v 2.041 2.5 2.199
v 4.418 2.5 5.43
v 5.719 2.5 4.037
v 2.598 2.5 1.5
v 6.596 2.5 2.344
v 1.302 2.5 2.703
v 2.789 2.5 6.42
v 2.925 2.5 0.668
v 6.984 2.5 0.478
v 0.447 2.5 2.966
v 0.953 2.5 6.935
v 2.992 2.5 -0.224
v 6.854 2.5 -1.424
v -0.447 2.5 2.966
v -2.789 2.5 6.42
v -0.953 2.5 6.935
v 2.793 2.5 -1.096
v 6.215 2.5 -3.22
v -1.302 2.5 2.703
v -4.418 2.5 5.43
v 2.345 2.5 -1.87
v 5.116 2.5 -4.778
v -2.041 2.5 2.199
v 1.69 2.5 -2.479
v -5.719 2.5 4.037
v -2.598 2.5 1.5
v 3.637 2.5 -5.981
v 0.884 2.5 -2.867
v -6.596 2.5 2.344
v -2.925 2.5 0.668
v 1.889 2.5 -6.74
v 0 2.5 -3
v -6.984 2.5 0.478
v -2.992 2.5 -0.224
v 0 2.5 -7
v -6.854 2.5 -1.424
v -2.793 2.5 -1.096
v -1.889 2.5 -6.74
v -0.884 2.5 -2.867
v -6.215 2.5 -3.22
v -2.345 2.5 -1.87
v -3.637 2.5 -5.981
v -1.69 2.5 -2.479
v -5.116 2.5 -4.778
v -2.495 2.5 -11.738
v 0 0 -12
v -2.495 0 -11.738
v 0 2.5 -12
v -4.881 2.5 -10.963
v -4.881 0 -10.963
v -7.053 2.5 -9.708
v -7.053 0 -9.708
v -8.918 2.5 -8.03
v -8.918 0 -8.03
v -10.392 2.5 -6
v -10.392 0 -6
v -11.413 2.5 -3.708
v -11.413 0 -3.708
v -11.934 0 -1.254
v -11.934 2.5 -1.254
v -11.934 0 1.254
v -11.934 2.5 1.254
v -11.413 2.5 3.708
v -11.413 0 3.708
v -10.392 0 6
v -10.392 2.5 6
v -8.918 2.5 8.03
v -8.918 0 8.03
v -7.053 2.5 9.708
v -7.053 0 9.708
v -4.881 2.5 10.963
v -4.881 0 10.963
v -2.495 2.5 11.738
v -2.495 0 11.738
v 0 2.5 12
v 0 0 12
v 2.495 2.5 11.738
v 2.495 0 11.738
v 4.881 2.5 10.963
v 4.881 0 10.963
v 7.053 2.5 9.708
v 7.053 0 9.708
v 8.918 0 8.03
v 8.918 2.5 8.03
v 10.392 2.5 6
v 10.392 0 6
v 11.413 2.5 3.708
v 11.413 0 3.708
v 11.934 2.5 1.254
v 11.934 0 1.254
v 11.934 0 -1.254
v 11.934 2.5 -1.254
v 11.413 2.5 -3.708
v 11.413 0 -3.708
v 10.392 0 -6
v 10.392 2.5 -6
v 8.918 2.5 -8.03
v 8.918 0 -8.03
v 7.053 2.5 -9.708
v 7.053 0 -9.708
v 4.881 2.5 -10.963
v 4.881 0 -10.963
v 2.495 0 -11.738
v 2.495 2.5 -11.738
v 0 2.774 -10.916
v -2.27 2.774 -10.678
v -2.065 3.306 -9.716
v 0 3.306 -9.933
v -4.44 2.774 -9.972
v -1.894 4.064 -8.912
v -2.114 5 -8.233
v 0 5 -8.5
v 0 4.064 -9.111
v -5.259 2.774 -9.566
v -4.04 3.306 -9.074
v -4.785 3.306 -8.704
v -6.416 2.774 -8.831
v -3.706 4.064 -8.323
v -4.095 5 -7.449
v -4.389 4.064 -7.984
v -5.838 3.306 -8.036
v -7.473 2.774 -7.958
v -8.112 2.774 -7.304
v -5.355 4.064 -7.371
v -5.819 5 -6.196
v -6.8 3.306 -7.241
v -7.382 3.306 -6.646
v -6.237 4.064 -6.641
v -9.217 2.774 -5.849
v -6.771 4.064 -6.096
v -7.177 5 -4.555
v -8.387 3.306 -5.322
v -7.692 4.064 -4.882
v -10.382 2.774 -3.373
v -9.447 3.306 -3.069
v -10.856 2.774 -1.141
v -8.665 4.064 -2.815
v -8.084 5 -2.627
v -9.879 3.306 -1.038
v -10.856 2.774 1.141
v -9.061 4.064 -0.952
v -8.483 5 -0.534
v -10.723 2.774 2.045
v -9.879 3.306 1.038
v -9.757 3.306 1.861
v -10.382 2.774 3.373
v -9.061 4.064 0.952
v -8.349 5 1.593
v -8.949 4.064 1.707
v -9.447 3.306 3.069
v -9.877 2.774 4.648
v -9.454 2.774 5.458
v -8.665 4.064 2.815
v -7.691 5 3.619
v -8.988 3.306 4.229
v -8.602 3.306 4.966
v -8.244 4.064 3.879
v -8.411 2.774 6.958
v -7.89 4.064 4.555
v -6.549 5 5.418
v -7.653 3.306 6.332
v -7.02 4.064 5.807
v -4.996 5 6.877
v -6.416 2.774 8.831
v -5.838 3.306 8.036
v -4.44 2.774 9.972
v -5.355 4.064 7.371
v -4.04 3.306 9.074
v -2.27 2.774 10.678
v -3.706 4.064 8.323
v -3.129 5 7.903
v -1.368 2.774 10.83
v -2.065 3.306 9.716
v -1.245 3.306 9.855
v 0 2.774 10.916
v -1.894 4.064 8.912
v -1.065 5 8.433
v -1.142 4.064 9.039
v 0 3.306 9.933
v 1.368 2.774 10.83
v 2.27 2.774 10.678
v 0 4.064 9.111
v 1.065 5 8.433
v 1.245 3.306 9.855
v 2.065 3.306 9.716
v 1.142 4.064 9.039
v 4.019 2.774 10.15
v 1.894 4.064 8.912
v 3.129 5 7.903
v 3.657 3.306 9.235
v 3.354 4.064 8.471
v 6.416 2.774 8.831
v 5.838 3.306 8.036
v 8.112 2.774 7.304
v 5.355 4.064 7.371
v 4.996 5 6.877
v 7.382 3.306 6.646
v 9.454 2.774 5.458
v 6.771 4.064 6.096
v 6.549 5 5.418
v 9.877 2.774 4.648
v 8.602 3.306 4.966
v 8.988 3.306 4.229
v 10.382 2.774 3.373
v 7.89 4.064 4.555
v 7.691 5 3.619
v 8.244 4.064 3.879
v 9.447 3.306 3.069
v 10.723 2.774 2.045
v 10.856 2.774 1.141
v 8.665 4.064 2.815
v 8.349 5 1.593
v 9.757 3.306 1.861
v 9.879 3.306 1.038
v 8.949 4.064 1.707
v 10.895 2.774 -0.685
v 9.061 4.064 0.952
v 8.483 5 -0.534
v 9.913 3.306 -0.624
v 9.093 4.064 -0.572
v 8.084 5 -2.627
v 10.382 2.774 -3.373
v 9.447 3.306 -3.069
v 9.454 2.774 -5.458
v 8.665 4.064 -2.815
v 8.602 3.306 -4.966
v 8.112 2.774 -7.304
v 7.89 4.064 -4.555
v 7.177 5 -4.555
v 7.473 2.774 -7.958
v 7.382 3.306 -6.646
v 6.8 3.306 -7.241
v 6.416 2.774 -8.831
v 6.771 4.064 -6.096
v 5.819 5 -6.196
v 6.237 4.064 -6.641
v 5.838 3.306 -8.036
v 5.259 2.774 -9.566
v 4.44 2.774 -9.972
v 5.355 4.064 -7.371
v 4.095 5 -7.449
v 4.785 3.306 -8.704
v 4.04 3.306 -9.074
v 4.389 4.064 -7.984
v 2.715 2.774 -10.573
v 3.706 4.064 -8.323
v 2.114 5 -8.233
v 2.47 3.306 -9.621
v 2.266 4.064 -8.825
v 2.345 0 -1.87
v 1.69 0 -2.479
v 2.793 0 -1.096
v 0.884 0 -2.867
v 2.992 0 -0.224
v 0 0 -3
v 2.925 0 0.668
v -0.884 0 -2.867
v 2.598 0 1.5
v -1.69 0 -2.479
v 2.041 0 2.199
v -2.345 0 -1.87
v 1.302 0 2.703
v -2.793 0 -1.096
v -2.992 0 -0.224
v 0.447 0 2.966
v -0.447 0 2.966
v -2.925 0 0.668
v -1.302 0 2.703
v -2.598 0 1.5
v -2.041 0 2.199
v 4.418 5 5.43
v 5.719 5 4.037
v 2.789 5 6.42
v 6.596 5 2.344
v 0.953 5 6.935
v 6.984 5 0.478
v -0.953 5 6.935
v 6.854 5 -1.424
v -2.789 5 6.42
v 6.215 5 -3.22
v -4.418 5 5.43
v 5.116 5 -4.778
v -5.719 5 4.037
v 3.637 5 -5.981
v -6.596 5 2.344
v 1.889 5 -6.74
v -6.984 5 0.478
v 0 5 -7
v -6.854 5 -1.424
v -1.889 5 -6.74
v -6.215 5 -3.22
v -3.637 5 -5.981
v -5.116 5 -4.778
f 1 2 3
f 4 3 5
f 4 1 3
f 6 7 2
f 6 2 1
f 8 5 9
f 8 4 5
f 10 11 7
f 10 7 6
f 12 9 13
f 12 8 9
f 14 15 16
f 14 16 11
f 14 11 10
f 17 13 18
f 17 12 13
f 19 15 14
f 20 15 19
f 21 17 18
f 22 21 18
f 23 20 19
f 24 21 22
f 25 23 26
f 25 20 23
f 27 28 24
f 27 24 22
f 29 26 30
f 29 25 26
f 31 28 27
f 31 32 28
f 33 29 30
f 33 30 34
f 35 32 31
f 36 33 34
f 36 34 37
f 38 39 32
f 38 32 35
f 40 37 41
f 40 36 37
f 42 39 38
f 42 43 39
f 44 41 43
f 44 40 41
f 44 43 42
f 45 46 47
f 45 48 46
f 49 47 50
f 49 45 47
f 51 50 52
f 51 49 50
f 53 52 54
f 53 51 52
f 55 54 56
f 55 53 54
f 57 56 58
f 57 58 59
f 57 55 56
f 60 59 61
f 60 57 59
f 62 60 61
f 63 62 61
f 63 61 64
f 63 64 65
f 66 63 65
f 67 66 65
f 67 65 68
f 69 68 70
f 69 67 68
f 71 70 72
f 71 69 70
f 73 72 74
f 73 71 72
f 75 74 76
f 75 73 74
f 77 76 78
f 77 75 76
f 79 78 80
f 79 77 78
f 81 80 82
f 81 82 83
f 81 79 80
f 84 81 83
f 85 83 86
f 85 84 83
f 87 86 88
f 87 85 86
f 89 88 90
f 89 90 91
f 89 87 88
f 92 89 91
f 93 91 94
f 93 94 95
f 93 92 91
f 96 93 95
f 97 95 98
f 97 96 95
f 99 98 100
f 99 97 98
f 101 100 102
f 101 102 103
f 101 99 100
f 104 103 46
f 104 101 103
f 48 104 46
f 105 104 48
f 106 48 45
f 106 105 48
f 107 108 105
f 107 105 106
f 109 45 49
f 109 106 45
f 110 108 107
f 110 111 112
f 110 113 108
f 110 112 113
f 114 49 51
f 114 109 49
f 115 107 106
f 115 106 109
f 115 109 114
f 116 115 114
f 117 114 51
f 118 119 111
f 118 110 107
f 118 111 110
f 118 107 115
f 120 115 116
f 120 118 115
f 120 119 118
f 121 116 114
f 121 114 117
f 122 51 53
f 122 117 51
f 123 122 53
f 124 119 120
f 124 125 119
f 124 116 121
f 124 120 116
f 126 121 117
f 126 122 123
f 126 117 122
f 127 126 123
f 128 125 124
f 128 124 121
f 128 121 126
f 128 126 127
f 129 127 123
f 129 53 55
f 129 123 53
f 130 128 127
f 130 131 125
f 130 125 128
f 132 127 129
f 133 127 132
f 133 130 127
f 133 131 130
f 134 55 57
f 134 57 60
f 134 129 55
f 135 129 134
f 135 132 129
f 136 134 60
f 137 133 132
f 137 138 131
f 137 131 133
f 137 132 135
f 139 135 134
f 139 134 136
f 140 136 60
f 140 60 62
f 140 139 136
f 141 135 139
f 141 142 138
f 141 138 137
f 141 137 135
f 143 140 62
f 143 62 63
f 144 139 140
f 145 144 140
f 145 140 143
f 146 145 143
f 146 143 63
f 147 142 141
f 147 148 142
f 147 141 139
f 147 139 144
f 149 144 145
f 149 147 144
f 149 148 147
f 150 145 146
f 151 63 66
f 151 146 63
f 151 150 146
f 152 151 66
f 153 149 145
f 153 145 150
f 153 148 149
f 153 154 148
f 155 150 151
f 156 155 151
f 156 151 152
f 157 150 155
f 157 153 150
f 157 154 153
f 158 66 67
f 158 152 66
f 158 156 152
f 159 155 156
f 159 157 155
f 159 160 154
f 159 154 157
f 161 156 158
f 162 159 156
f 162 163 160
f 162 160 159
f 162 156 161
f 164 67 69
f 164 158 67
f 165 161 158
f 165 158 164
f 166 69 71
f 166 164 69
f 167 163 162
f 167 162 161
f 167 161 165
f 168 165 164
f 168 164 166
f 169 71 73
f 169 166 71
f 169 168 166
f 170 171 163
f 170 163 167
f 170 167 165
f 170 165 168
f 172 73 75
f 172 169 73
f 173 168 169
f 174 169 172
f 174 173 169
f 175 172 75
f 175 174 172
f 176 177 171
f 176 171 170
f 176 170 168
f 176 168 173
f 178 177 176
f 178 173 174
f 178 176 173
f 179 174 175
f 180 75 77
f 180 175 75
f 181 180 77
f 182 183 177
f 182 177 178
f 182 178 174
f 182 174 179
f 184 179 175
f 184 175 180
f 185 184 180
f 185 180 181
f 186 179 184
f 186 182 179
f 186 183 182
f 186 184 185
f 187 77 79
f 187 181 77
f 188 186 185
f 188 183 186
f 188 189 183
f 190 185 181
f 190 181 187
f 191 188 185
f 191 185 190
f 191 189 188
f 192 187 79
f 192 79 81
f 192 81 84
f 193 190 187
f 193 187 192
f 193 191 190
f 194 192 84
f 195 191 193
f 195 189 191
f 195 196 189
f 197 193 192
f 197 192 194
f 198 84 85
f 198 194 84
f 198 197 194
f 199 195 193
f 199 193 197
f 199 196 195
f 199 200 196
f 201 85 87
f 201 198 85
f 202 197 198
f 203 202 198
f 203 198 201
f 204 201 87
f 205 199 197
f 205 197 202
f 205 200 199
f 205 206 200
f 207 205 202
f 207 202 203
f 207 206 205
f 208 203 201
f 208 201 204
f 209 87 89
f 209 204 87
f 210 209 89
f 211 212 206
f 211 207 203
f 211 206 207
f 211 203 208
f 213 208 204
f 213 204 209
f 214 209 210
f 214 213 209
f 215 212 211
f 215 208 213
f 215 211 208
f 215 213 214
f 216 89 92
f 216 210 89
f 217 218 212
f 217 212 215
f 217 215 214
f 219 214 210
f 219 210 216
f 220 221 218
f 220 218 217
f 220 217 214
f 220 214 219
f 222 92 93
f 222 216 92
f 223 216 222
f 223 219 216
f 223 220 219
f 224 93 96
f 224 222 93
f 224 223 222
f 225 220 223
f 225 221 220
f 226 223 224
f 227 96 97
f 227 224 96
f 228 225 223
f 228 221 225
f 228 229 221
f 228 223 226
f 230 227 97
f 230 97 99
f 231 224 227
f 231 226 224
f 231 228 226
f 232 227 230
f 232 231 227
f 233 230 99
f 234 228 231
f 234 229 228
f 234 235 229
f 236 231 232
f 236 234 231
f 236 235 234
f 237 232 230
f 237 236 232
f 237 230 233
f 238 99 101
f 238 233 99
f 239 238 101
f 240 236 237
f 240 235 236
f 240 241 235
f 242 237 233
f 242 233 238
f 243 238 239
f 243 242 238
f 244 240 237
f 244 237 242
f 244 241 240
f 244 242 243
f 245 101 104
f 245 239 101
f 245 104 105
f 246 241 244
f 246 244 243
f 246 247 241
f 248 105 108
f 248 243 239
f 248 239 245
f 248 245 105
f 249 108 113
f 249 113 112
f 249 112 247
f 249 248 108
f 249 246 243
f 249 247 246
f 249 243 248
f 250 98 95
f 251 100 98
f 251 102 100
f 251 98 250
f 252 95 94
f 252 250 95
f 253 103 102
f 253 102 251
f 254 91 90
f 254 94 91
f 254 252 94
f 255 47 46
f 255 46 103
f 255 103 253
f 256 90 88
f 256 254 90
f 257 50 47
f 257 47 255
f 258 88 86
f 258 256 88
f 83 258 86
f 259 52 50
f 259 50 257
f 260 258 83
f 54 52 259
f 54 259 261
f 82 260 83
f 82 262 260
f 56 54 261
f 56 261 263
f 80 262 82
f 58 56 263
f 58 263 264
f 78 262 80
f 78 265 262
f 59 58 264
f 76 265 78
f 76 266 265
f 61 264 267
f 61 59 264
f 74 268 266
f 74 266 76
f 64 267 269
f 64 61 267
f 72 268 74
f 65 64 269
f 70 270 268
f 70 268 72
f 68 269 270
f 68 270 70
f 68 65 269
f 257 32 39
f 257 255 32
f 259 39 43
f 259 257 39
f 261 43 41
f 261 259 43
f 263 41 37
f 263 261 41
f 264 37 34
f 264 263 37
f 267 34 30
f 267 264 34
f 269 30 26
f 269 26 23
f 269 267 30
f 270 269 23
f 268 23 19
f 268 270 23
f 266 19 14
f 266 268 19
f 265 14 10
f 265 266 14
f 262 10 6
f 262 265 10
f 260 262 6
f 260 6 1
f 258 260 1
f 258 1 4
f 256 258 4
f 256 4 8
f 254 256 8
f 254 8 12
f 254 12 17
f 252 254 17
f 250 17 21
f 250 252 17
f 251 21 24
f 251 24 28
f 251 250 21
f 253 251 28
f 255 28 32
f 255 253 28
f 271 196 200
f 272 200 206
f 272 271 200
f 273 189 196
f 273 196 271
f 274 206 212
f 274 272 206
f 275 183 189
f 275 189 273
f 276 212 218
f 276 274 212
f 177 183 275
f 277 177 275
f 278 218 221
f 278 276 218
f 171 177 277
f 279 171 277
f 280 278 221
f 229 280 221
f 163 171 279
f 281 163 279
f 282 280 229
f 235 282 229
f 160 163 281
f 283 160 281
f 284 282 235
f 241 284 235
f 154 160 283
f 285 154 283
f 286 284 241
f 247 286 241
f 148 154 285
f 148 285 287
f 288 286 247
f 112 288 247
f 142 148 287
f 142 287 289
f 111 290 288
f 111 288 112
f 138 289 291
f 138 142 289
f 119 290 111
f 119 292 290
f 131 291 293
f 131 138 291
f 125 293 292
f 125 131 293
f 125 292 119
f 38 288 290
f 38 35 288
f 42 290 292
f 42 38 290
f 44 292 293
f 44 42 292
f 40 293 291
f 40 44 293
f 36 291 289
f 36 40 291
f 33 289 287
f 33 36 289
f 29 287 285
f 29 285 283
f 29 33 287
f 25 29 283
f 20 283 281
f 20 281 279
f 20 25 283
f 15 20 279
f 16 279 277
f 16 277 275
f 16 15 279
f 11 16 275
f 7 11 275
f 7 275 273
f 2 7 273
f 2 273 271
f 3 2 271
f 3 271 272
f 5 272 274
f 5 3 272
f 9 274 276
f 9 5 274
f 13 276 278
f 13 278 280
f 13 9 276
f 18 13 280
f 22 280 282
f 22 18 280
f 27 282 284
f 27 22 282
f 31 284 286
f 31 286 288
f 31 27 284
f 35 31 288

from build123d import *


with BuildPart() as part:
    # Sketch2 → Revolve1 (revolve)
    with BuildSketch(Plane(origin=(0, 0, 0), x_dir=(0, 0, -1), z_dir=(1, 0, 0))):
        with BuildLine():
            Line((12, 0), (12, 2.5))
            ThreePointArc((12, 2.5), (9.932956508, 3.306139112), (8.5, 5))
            Line((8.5, 5), (7, 5))
            Line((7, 5), (7, 2.5))
            Line((7, 2.5), (3, 2.5))
            Line((3, 2.5), (3, 0))
            Line((3, 0), (12, 0))
        make_face()
    revolve(axis=Axis((0, 0, 0), (0, 1, 0)))


solid = part.part
